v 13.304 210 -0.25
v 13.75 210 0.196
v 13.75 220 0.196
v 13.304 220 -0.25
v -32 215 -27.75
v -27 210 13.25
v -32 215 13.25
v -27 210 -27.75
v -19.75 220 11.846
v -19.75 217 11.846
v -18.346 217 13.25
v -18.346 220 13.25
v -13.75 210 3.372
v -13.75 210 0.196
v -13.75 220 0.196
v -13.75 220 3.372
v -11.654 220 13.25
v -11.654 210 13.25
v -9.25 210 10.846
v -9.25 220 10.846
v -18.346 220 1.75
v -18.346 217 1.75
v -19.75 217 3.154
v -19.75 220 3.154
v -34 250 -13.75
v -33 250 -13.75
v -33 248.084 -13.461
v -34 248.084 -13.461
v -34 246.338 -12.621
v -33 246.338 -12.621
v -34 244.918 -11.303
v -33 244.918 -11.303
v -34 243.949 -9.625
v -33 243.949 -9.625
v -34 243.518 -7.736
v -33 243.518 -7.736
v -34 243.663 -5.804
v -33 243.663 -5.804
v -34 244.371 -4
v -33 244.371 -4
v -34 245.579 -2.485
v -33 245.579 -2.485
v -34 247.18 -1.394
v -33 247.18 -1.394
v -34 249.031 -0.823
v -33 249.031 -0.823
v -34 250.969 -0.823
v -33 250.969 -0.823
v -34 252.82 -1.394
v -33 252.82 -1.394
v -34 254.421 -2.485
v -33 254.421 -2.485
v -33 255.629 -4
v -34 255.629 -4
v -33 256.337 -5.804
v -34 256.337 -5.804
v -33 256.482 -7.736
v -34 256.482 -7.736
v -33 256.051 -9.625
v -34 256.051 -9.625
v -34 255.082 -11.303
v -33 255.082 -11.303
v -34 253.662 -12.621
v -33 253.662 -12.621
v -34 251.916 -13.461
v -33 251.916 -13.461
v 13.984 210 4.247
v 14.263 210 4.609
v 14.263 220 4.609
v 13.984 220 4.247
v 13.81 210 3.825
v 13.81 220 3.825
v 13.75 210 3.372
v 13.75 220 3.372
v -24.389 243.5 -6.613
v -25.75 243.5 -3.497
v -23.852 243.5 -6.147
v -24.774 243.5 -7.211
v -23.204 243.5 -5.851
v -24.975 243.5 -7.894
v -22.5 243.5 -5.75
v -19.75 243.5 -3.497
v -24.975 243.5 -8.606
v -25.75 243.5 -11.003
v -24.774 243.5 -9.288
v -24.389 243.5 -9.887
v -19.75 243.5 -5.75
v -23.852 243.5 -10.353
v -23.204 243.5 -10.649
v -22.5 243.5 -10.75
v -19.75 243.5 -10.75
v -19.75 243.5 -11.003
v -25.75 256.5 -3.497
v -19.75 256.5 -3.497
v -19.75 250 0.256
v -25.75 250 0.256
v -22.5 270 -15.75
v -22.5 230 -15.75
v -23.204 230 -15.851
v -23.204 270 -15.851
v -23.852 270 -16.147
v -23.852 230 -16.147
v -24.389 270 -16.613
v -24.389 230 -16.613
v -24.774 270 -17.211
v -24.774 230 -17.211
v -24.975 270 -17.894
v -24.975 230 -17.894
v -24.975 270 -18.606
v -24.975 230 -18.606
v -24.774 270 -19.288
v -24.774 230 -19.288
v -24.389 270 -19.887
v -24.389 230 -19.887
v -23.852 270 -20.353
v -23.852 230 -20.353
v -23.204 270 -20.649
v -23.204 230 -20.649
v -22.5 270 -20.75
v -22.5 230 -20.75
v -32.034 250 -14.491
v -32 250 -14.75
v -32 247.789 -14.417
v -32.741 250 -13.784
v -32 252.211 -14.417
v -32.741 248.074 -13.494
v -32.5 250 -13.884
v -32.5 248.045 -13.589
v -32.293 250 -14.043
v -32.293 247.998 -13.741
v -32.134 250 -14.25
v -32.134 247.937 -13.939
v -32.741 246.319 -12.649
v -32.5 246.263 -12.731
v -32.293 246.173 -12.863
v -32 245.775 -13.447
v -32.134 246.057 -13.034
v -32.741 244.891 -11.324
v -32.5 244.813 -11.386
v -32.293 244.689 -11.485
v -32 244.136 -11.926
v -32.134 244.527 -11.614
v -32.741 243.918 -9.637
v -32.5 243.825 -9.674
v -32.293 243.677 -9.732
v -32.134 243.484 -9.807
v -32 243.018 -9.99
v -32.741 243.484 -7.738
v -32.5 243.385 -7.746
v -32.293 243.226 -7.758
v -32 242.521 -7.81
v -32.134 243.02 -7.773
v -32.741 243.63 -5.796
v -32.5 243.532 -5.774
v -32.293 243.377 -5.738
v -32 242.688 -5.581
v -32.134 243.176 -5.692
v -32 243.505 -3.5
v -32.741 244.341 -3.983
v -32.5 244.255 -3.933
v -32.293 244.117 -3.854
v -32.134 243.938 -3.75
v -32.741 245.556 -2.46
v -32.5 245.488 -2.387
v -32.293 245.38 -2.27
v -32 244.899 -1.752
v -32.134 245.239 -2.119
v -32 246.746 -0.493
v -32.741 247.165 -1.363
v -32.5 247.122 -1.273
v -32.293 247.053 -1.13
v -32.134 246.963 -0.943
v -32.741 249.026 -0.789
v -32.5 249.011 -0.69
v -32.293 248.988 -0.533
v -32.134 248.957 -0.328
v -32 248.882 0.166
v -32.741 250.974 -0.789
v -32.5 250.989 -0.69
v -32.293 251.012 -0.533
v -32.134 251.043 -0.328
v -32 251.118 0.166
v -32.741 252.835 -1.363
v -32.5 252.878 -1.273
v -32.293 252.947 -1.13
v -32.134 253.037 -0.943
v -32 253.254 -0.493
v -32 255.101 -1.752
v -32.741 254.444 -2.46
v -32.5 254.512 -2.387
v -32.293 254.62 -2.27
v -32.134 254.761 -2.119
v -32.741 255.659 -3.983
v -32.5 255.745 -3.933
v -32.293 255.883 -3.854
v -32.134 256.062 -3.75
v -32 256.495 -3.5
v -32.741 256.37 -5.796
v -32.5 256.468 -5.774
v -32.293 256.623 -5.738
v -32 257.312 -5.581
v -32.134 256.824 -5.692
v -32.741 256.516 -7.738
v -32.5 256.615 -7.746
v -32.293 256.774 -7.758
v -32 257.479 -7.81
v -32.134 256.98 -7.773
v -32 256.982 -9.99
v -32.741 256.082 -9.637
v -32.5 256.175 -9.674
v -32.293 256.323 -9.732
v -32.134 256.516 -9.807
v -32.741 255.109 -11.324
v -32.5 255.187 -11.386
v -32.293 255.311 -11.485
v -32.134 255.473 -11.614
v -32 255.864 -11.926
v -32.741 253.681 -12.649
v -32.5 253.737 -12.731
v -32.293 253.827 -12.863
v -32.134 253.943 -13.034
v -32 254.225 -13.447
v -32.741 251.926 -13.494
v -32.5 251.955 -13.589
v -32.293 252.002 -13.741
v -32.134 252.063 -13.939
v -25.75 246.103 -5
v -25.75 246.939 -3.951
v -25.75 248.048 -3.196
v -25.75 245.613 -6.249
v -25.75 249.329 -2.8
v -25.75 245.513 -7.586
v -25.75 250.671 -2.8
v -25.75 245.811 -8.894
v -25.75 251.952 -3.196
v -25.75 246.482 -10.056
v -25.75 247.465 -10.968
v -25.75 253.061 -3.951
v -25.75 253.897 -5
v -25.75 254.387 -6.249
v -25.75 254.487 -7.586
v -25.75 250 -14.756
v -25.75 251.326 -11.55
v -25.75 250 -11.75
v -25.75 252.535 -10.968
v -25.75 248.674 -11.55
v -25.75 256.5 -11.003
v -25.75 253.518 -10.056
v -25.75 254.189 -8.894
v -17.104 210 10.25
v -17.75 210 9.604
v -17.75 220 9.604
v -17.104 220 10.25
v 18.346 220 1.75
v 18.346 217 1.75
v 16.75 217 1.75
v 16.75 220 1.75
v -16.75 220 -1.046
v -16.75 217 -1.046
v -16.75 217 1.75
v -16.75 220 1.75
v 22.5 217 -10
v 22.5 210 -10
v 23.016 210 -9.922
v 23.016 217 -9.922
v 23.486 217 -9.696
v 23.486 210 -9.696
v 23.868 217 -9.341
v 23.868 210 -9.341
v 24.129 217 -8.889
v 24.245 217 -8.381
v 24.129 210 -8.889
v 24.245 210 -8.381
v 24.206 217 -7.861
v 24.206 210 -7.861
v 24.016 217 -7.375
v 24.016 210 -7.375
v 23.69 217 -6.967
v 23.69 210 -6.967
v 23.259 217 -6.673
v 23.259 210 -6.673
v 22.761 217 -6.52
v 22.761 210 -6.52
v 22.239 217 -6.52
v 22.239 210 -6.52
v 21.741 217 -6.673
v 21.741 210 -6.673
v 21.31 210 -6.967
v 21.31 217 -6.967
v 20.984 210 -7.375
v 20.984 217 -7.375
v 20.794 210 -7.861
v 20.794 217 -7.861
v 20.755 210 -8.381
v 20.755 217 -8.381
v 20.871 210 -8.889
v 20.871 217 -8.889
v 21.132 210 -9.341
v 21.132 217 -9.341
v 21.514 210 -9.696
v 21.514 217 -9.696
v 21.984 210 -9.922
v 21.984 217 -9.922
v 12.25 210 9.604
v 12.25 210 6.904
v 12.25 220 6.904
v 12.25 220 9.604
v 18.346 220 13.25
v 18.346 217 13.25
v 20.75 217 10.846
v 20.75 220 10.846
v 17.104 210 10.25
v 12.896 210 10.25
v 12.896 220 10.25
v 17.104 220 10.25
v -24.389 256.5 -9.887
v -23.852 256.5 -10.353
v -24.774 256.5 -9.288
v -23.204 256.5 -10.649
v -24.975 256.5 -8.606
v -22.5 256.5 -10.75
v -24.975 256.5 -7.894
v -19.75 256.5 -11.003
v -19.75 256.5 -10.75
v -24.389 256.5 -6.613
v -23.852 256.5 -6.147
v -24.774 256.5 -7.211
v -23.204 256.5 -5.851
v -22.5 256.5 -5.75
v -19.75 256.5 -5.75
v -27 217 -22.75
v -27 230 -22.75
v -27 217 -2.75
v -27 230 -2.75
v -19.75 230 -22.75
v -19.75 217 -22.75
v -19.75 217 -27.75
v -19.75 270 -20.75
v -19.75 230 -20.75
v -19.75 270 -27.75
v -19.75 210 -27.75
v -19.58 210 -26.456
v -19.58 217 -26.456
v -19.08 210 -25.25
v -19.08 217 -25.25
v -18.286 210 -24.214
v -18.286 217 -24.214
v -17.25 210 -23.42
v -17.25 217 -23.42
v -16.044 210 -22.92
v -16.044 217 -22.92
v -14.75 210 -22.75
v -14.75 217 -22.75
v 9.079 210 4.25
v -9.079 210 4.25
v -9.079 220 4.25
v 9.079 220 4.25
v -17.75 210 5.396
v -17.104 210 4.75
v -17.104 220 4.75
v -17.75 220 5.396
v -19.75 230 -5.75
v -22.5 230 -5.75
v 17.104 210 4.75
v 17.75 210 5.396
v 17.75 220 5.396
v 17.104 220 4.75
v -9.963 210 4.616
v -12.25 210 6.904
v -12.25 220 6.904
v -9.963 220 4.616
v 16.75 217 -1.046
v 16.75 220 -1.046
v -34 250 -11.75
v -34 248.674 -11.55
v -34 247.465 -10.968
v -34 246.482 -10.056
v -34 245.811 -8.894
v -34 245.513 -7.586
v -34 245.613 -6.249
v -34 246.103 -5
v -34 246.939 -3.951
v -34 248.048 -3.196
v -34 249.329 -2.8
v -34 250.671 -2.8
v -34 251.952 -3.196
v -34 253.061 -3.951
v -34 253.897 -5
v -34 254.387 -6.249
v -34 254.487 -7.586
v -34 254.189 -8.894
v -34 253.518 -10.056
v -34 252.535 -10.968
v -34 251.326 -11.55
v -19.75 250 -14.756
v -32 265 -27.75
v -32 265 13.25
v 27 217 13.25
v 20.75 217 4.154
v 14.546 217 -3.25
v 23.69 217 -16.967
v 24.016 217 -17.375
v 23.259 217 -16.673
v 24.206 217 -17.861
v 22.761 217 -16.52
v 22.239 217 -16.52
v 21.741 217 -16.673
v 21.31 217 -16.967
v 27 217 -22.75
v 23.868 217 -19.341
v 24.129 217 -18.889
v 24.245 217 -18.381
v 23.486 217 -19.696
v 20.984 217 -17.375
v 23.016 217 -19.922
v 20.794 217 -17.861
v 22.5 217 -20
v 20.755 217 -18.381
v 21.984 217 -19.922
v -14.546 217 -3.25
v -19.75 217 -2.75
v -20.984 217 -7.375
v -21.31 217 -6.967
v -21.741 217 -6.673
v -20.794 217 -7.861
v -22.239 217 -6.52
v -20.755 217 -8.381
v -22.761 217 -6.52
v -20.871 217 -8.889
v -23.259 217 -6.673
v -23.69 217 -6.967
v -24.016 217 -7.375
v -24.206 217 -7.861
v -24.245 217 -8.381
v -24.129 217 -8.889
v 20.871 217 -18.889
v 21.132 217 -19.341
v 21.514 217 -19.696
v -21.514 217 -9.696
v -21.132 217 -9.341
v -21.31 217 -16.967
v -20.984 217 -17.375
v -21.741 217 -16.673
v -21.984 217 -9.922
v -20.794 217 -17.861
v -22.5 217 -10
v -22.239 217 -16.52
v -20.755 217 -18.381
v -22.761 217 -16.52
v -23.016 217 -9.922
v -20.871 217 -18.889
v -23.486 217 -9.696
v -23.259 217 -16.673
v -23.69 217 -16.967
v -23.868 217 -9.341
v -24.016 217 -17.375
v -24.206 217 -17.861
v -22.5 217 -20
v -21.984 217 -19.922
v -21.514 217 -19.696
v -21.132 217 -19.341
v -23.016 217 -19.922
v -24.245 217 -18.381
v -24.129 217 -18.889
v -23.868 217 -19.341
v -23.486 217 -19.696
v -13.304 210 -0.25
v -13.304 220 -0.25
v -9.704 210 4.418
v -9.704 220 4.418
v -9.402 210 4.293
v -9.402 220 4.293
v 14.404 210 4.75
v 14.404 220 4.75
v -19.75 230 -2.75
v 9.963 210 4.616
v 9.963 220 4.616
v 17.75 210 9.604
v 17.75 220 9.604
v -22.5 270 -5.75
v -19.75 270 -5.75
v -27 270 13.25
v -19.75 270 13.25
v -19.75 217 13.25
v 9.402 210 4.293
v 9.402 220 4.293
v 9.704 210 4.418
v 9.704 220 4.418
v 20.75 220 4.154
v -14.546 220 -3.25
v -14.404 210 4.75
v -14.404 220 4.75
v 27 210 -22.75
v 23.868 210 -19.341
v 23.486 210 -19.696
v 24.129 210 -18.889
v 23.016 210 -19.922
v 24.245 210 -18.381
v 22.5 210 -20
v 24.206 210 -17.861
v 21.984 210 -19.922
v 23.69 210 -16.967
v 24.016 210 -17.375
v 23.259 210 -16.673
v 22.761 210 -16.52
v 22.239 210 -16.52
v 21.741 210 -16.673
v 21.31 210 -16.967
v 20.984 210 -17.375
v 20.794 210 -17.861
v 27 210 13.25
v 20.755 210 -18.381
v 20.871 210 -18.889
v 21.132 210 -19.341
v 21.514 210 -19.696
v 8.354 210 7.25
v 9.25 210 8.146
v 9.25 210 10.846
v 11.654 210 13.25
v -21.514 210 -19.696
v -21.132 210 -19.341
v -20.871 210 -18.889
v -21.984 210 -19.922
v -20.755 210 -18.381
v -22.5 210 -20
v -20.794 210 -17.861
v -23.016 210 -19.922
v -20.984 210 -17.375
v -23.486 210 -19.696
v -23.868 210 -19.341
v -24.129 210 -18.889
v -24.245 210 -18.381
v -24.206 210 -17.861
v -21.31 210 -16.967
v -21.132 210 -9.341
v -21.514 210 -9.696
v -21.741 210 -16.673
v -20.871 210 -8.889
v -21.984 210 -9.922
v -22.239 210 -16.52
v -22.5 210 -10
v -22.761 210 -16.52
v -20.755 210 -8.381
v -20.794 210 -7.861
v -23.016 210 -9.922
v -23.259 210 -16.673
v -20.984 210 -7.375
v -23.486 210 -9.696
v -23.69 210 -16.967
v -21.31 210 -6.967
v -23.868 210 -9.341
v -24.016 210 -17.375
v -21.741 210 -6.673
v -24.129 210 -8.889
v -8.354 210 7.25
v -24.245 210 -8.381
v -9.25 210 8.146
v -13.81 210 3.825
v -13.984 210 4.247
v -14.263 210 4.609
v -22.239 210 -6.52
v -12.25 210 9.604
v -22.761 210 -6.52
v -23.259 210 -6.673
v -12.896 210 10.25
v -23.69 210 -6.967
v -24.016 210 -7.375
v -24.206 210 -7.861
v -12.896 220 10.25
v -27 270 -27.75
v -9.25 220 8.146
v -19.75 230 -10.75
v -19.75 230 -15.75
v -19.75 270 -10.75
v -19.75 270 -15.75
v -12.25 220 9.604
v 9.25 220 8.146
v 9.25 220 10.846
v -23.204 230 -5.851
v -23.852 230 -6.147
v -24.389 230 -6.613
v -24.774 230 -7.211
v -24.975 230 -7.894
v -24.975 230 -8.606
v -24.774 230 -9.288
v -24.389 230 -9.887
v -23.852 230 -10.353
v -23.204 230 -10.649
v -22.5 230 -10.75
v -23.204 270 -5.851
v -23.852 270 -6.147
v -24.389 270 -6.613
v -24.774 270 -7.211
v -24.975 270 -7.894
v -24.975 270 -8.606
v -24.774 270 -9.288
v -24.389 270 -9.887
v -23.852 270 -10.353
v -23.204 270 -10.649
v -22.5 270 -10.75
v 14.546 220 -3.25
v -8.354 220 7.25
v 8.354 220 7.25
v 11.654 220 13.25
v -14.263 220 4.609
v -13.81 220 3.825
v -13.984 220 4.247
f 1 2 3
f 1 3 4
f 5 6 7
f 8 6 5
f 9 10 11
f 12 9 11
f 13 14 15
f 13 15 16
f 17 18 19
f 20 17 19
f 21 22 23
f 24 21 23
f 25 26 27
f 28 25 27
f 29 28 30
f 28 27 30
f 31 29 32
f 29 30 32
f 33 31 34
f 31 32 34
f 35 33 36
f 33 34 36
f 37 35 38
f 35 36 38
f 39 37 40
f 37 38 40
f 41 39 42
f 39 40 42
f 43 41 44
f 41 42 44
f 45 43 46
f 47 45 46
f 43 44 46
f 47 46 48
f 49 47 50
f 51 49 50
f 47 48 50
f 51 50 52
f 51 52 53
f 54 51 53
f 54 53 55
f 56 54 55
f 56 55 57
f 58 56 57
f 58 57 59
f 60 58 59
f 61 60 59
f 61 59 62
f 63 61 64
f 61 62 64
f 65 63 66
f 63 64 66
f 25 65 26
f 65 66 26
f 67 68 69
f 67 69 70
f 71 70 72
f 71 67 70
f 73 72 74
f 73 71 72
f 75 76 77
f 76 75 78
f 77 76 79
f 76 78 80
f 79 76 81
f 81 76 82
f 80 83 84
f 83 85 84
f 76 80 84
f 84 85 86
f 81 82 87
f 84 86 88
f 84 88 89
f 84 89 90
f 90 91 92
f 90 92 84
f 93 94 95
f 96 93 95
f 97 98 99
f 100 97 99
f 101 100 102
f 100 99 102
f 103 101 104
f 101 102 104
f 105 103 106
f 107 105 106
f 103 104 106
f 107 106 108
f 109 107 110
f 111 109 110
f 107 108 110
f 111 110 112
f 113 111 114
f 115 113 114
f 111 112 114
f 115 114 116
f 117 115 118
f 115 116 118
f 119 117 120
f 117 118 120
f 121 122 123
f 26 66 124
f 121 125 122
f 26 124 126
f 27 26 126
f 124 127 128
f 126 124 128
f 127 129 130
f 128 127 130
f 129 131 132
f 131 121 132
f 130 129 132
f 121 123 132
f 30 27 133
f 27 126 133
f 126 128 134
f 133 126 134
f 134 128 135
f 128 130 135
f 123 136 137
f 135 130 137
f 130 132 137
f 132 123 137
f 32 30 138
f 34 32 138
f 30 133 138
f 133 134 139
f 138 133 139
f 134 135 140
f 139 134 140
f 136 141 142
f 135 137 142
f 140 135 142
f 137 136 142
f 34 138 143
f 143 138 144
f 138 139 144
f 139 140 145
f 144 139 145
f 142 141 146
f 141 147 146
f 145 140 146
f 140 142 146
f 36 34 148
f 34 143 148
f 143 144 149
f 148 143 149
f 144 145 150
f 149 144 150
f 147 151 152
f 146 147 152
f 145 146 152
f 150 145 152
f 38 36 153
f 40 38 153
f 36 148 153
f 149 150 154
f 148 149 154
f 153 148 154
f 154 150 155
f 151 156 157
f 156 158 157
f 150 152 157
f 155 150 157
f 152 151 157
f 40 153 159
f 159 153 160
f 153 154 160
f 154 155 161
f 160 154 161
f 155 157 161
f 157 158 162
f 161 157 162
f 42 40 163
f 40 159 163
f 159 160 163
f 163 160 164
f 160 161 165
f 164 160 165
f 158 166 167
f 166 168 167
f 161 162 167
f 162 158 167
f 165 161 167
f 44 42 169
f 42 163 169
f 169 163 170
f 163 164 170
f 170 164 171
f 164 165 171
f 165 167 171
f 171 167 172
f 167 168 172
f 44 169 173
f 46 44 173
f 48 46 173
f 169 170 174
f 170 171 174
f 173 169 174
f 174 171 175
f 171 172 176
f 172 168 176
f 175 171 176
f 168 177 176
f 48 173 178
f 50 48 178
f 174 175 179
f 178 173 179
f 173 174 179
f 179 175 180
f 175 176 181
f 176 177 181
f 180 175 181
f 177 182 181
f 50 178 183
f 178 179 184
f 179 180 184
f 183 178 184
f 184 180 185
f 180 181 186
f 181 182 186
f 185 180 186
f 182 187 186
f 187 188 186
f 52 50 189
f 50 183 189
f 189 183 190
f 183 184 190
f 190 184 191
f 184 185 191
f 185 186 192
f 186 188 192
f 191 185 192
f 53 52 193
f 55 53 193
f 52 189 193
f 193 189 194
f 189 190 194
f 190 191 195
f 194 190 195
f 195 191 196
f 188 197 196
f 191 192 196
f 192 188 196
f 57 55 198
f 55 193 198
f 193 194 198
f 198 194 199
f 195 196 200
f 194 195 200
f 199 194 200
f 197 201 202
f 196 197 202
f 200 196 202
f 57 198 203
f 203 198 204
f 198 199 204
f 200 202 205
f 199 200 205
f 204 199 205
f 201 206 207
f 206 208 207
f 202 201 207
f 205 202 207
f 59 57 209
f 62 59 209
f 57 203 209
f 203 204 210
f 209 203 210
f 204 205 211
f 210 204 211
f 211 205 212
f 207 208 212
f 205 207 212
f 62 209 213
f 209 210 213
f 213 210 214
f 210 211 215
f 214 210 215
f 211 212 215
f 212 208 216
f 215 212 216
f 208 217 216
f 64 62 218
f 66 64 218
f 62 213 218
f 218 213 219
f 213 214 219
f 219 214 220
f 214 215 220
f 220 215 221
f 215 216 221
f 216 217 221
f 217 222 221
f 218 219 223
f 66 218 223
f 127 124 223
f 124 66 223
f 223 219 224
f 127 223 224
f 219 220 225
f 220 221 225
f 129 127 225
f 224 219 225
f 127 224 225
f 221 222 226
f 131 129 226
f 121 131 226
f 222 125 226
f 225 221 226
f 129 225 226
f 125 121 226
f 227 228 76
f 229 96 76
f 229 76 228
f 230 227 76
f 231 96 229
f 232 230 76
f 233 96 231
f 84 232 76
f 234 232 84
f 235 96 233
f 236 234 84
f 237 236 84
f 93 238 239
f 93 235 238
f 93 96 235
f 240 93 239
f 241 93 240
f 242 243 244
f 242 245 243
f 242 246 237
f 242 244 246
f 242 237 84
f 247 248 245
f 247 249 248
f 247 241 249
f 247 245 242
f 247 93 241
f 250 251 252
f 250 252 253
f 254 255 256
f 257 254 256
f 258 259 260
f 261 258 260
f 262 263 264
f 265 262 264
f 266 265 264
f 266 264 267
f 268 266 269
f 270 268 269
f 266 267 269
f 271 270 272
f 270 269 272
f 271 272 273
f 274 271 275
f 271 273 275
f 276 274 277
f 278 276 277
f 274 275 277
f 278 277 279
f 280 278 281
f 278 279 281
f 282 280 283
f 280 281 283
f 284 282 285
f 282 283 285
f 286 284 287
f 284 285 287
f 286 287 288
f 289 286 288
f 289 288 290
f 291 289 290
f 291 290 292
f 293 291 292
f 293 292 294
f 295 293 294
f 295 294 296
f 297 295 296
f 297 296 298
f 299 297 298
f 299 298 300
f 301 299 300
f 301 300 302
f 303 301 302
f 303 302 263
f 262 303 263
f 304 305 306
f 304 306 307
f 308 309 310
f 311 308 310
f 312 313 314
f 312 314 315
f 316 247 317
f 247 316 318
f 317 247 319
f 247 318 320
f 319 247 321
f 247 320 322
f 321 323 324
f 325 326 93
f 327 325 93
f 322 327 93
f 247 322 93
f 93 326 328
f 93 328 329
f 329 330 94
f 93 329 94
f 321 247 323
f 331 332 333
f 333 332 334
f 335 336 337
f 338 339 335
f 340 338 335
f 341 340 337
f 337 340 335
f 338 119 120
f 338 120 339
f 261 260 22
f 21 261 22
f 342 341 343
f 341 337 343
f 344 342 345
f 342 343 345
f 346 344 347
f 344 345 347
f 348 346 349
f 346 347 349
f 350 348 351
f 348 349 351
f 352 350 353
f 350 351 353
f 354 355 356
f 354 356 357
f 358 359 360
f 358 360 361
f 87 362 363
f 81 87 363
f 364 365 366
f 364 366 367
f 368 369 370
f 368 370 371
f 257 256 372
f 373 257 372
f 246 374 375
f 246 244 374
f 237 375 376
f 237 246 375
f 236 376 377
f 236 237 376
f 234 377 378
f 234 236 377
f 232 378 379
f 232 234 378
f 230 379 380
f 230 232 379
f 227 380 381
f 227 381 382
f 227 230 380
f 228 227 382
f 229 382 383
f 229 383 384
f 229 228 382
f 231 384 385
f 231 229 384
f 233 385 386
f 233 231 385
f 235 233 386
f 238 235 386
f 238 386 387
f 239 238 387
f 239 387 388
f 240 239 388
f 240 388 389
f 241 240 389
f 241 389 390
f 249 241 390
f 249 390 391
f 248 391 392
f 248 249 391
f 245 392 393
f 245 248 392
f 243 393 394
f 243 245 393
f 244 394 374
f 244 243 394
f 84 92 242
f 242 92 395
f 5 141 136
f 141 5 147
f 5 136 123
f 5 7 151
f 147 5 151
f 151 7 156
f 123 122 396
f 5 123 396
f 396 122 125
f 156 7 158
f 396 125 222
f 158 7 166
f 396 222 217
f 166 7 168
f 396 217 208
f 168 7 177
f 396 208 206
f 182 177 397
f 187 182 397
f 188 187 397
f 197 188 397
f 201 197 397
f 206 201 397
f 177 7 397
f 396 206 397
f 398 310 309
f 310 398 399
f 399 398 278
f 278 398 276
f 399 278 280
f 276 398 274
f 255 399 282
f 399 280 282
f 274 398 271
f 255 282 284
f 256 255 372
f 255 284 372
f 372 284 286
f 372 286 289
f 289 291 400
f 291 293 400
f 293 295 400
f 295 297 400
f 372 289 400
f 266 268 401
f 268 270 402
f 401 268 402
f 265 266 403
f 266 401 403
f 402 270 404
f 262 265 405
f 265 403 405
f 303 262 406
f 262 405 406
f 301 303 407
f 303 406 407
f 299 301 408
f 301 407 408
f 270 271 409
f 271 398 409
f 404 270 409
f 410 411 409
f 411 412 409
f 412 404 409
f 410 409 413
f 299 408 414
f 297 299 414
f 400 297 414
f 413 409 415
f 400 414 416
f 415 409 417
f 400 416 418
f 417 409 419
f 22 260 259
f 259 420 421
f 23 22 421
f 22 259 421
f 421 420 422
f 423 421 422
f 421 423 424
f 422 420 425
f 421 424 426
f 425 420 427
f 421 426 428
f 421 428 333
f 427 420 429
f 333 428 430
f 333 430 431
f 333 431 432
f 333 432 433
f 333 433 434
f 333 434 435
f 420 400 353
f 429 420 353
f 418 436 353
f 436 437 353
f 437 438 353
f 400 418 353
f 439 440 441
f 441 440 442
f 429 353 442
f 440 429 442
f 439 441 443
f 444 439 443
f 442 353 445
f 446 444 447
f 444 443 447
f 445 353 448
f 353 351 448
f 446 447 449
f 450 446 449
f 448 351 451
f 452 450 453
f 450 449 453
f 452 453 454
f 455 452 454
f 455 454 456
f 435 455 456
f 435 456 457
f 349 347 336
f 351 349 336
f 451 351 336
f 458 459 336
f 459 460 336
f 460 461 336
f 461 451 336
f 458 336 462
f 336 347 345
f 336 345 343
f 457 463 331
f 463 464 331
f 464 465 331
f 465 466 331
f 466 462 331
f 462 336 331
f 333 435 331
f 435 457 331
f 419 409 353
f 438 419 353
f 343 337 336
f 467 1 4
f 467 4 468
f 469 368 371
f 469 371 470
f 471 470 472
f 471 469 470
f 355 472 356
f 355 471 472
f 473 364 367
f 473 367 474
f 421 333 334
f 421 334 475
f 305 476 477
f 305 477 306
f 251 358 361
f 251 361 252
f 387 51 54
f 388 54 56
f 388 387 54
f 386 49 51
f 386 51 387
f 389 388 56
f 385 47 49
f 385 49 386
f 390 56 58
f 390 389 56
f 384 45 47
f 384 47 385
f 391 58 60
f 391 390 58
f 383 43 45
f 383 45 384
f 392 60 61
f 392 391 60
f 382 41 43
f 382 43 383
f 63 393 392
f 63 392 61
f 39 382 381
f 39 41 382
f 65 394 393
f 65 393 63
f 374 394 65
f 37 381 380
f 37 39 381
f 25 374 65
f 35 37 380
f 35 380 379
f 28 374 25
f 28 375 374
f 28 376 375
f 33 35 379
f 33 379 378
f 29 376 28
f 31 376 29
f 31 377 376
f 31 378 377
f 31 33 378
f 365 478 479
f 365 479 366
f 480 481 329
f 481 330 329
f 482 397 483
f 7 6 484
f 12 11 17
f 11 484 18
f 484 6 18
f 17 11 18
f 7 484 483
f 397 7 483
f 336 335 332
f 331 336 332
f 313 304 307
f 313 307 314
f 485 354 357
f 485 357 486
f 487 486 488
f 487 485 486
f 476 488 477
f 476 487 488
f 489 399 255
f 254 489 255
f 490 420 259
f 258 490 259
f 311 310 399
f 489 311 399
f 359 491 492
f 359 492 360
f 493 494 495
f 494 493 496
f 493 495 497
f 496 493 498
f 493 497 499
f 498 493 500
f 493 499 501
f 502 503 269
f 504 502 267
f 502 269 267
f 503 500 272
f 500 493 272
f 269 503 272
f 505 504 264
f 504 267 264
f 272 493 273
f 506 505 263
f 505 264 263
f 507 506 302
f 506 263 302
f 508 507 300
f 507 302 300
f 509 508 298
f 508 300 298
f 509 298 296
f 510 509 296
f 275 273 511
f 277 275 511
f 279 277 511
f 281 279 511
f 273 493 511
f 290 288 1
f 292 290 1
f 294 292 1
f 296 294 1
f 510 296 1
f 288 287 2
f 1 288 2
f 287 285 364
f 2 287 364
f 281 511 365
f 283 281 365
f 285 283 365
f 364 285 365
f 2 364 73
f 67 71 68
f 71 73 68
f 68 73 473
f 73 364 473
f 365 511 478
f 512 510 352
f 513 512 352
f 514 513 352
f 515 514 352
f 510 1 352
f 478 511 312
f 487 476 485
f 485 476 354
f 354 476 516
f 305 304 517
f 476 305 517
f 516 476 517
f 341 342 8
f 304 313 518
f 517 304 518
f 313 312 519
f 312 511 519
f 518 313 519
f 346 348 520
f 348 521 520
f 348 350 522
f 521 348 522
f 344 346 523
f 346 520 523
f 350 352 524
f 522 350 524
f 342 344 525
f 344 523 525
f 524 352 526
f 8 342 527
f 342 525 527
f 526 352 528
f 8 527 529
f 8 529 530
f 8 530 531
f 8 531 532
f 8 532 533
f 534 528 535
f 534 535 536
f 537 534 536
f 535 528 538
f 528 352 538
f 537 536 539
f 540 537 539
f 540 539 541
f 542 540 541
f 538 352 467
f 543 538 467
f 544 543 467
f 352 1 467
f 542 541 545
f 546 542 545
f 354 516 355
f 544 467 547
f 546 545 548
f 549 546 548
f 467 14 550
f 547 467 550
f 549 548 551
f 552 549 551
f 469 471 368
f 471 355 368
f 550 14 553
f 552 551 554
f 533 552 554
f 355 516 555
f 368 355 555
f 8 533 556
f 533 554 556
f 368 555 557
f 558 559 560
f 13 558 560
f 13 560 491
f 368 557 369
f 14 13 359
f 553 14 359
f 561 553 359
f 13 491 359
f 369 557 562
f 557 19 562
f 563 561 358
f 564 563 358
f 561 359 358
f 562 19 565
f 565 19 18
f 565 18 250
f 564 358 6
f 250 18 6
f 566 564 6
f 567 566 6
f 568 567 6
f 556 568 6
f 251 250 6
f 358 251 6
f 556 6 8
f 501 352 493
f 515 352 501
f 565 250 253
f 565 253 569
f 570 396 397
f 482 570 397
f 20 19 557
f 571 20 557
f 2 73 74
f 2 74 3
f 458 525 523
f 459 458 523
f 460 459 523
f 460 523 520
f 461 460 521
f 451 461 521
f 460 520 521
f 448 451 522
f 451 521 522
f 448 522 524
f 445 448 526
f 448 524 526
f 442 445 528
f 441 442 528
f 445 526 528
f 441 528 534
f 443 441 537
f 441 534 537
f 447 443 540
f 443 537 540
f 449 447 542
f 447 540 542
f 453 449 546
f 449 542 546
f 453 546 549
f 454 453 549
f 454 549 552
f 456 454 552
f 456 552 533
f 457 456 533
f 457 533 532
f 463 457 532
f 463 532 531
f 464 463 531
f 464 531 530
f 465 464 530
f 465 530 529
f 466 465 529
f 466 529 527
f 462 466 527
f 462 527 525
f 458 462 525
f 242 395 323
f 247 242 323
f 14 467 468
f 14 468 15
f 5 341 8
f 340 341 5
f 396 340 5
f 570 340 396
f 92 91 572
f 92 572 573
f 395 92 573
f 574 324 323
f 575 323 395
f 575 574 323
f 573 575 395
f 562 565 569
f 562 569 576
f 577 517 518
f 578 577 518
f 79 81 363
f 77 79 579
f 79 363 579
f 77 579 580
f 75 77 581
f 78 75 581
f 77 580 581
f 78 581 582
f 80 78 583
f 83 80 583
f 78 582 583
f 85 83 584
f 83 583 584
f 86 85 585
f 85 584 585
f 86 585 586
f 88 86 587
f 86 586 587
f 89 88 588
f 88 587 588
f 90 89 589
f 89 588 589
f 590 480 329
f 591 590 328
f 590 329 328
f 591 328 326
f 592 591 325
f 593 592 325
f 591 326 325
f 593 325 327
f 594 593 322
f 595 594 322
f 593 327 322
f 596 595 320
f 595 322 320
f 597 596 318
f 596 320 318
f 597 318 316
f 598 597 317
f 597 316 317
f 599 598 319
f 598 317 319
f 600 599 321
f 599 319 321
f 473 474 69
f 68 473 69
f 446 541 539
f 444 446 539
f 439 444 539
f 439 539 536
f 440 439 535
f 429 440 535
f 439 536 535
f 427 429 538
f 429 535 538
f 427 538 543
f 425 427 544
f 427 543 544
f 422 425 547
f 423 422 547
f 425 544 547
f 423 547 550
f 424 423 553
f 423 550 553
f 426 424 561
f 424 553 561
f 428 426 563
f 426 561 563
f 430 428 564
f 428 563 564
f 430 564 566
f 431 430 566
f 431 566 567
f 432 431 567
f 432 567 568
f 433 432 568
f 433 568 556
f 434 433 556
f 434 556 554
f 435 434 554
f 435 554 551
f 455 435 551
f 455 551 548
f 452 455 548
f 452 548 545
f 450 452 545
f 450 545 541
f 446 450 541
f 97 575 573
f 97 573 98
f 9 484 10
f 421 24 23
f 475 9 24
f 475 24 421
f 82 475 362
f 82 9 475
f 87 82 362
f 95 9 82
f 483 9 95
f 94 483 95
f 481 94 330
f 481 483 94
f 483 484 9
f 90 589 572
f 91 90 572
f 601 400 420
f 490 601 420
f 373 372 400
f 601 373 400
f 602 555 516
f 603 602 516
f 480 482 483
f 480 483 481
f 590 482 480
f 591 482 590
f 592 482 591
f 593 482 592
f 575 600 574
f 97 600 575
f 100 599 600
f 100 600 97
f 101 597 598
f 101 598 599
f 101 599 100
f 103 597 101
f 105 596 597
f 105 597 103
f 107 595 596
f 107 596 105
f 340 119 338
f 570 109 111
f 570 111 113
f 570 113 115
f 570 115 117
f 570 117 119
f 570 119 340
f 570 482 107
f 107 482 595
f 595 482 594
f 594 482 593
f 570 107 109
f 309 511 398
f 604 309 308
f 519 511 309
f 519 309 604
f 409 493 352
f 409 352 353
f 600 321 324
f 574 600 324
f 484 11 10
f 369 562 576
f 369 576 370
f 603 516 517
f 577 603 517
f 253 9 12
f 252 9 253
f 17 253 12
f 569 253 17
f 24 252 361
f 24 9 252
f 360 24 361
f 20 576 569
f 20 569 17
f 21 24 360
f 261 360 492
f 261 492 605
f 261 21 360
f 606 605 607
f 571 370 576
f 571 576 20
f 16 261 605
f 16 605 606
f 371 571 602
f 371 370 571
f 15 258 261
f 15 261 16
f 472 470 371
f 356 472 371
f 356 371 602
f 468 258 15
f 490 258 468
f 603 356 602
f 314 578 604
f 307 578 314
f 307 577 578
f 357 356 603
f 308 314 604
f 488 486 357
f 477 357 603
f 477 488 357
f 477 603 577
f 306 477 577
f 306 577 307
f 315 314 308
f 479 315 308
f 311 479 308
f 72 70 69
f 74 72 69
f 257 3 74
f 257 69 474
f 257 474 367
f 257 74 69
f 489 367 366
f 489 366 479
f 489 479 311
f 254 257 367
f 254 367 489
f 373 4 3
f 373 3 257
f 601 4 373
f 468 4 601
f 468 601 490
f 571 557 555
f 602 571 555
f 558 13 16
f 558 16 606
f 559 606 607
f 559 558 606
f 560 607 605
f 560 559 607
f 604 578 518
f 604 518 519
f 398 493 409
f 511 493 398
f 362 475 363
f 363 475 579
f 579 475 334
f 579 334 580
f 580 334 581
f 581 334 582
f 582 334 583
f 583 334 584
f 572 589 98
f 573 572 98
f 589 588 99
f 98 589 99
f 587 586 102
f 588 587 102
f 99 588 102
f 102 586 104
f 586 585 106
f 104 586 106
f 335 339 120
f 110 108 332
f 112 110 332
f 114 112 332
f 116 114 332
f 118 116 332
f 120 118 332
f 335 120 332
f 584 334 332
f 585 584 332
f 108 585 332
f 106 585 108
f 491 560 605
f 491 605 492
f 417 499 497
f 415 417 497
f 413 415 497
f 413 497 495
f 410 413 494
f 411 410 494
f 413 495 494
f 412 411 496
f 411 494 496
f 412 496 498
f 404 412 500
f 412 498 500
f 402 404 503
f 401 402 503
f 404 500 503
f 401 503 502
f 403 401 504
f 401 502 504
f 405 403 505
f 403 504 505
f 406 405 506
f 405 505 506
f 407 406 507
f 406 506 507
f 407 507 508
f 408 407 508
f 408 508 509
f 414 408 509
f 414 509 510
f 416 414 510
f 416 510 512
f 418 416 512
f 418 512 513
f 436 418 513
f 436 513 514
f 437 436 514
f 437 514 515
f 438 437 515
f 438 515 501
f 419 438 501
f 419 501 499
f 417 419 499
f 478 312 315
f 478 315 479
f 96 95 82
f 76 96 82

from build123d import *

# Parameters (mm, degrees)
BOSS_EXTRUDE1_DEPTH = 400
BOSS_EXTRUDE2_DEPTH = 10
SKETCH3_R           = 43.000999871
CUT_EXTRUDE1_DEPTH  = 447.360216168
BOSS_EXTRUDE3_DEPTH = 7
SKETCH5_R           = 1.75
CUT_EXTRUDE2_DEPTH  = 33
SKETCH6_W           = 36.000000185
SKETCH6_H           = 60
BOSS_EXTRUDE4_DEPTH = 5
SKETCH7_W           = 7.24997928
SKETCH7_H           = 16
BOSS_EXTRUDE5_DEPTH = 53
SKETCH8_W           = 12.24997928
SKETCH8_H           = 60
BOSS_EXTRUDE6_DEPTH = 5
FILLET1_R           = 5
SKETCH10_W          = 20.000000185
SKETCH10_H          = 40
BOSS_EXTRUDE7_DEPTH = 7.24997928
CUT_EXTRUDE3_DEPTH  = 6
CUT_EXTRUDE4_DEPTH  = 68.845857758
SKETCH12_R          = 4.5
CUT_EXTRUDE5_DEPTH  = 16
CHAMFER2_SIZE       = 5
CHAMFER3_SIZE       = 5
SKETCH13_R          = 6.5
SKETCH13_R_2        = 4.5
BOSS_EXTRUDE8_DEPTH = 2
FILLET2_R           = 1


with BuildPart() as part:
    # Sketch1 → Boss-Extrude1 (new body)
    with BuildSketch(Plane(origin=(0, 200, 0), x_dir=(1, 0, 0), z_dir=(0, 1, 0))):
        with BuildLine():
            Line((1e-09, -3.855700002), (0.25, -4.00003757))
            Line((0.25, -4.00003757), (9.078700232, -4.00003757))
            ThreePointArc((9.078700232, -4.00003757), (9.652725366, -4.114218268), (10.139360377, -4.439377387))
            Line((10.139360377, -4.439377387), (12.500020747, -6.800037757))
            Line((12.500020747, -6.800037757), (12.500020747, -9.500037757))
            Line((12.500020747, -9.500037757), (13.00002072, -10.000037755))
            Line((13.00002072, -10.000037755), (17.00002072, -10.000037755))
            Line((17.00002072, -10.000037755), (17.500020747, -9.500037752))
            Line((17.500020747, -9.500037752), (17.500020747, -5.500037752))
            Line((17.500020747, -5.500037752), (17.00002075, -5.0000377))
            Line((17.00002075, -5.0000377), (14.30002072, -5.0000377))
            Line((14.30002072, -5.0000377), (14.085807141, -4.785824121))
            ThreePointArc((14.085807141, -4.785824121), (13.652261651, -4.136977442), (13.50002072, -3.371610598))
            Line((13.50002072, -3.371610598), (13.50002072, -0.30003757))
            Line((13.50002072, -0.30003757), (13.20002072, -3.757e-05))
            Line((13.20002072, -3.757e-05), (7.50002072, -3.757e-05))
            Line((7.50002072, -3.757e-05), (7.40002072, -0.10003757))
            Line((7.40002072, -0.10003757), (-7.40002072, -0.10003757))
            Line((-7.40002072, -0.10003757), (-7.50002072, -3.757e-05))
            Line((-7.50002072, -3.757e-05), (-13.20002072, -3.757e-05))
            Line((-13.20002072, -3.757e-05), (-13.50002072, -0.30003757))
            Line((-13.50002072, -0.30003757), (-13.50002072, -3.371610628))
            ThreePointArc((-13.50002072, -3.371610628), (-13.652261651, -4.136977472), (-14.085807141, -4.785824151))
            Line((-14.085807141, -4.785824151), (-14.30002069, -5.0000377))
            Line((-14.30002069, -5.0000377), (-17.00002072, -5.0000377))
            Line((-17.00002072, -5.0000377), (-17.50002072, -5.50003767))
            Line((-17.50002072, -5.50003767), (-17.50002072, -9.50003767))
            Line((-17.50002072, -9.50003767), (-17.000020665, -10.000037755))
            Line((-17.000020665, -10.000037755), (-13.00002072, -10.000037755))
            Line((-13.00002072, -10.000037755), (-12.500020741, -9.500037764))
            Line((-12.500020741, -9.500037764), (-12.500020741, -6.800037764))
            Line((-12.500020741, -6.800037764), (-10.139360364, -4.439377387))
            ThreePointArc((-10.139360364, -4.439377387), (-9.652725352, -4.114218268), (-9.078700218, -4.00003757))
            Line((-9.078700218, -4.00003757), (-0.25, -4.00003757))
            Line((-0.25, -4.00003757), (1e-09, -3.855700002))
        make_face()
    extrude(amount=-BOSS_EXTRUDE1_DEPTH)

    # Sketch3 → Cut-Extrude1 (cut)
    with BuildSketch(Plane(origin=(0, 200, 0), x_dir=(1, 0, 0), z_dir=(0, 1, 0))):
        with Locations((0, -0.10003757)):
            Circle(SKETCH3_R)
    extrude(amount=-CUT_EXTRUDE1_DEPTH, mode=Mode.SUBTRACT)


with BuildPart() as body_2:
    # Sketch2 → Boss-Extrude2 (new body)
    with BuildSketch(Plane(origin=(0, 210, 0), x_dir=(1, 0, 0), z_dir=(0, 1, 0))):
        Polygon((-8.353826469, -7.25003757), (8.353826482, -7.25003757), (9.250020747, -8.146231835), (9.250020747, -10.846231788), (11.653826595, -13.250037755), (18.34621475, -13.250037755), (20.750020747, -10.846231878), (20.750020747, -4.153843779), (18.346214932, -1.7500377), (16.75002072, -1.7500377), (16.75002072, 1.046156508), (14.546214798, 3.24996243), (-14.546214798, 3.24996243), (-16.75002072, 1.046156508), (-16.75002072, -1.7500377), (-18.346214741, -1.7500377), (-20.75002072, -4.153843535), (-20.75002072, -10.846231691), (-18.3462148, -13.250037755), (-11.653826621, -13.250037755), (-9.250020741, -10.846231821), (-9.250020741, -8.146231842), align=None)
        with BuildLine():
            Line((13.303574111, 0.24996243), (-13.303574111, 0.24996243))
            Line((-13.303574111, 0.24996243), (-13.75002072, -0.196484179))
            Line((-13.75002072, -0.196484179), (-13.75002072, -3.371610628))
            ThreePointArc((-13.75002072, -3.371610628), (-13.883231534, -4.041306614), (-14.262583837, -4.609047456))
            Line((-14.262583837, -4.609047456), (-14.403574081, -4.7500377))
            Line((-14.403574081, -4.7500377), (-17.103574106, -4.7500377))
            Line((-17.103574106, -4.7500377), (-17.75002072, -5.396484275))
            Line((-17.75002072, -5.396484275), (-17.75002072, -9.603591056))
            Line((-17.75002072, -9.603591056), (-17.10357406, -10.250037755))
            Line((-17.10357406, -10.250037755), (-12.896467328, -10.250037755))
            Line((-12.896467328, -10.250037755), (-12.250020741, -9.603591153))
            Line((-12.250020741, -9.603591153), (-12.250020741, -6.903591155))
            Line((-12.250020741, -6.903591155), (-9.962583668, -4.616154083))
            ThreePointArc((-9.962583668, -4.616154083), (-9.557054494, -4.345188152), (-9.078700218, -4.25003757))
            Line((-9.078700218, -4.25003757), (9.078700232, -4.25003757))
            ThreePointArc((9.078700232, -4.25003757), (9.557054508, -4.345188152), (9.962583682, -4.616154083))
            Line((9.962583682, -4.616154083), (12.250020747, -6.903591148))
            Line((12.250020747, -6.903591148), (12.250020747, -9.603591144))
            Line((12.250020747, -9.603591144), (12.896467326, -10.250037755))
            Line((12.896467326, -10.250037755), (17.103574107, -10.250037755))
            Line((17.103574107, -10.250037755), (17.750020747, -9.603591147))
            Line((17.750020747, -9.603591147), (17.750020747, -5.39648437))
            Line((17.750020747, -5.39648437), (17.103574149, -4.7500377))
            Line((17.103574149, -4.7500377), (14.403574111, -4.7500377))
            Line((14.403574111, -4.7500377), (14.262583837, -4.609047426))
            ThreePointArc((14.262583837, -4.609047426), (13.883231534, -4.041306584), (13.75002072, -3.371610598))
            Line((13.75002072, -3.371610598), (13.75002072, -0.196484179))
            Line((13.75002072, -0.196484179), (13.303574111, 0.24996243))
        make_face(mode=Mode.SUBTRACT)
    extrude(amount=BOSS_EXTRUDE2_DEPTH)

    # Sketch4 → Boss-Extrude3 (add)
    with BuildSketch(Plane(origin=(0, 210, 0), x_dir=(-1, 0, 0), z_dir=(0, -1, 0))):
        Polygon((27, -13.250037755), (27, 22.74996243), (-27, 22.74996243), (-27, -13.250037755), (-18.34621475, -13.250037755), (-20.750020747, -10.846231878), (-20.750020747, -4.153843779), (-18.346214932, -1.7500377), (-16.75002072, -1.7500377), (-16.75002072, 1.046156508), (-14.546214798, 3.24996243), (14.546214798, 3.24996243), (16.75002072, 1.046156508), (16.75002072, -1.7500377), (18.346214741, -1.7500377), (20.75002072, -4.153843535), (20.75002072, -10.846231691), (18.3462148, -13.250037755), align=None)
    extrude(amount=-BOSS_EXTRUDE3_DEPTH)

    # Sketch5 → Cut-Extrude2 (cut)
    with BuildSketch(Plane(origin=(0, 210, 0), x_dir=(-1, 0, 0), z_dir=(0, -1, 0))):
        with Locations(Location((22.5, 18.24996243, 0), (0, 0, 90))):
            Circle(SKETCH5_R)
        with Locations(Location((22.5, 8.24996243, 0), (0, 0, 90))):
            Circle(SKETCH5_R)
        with Locations(Location((-22.5, 8.24996243, 0), (0, 0, 90))):
            Circle(SKETCH5_R)
        with Locations(Location((-22.5, 18.24996243, 0), (0, 0, 90))):
            Circle(SKETCH5_R)
    extrude(amount=-CUT_EXTRUDE2_DEPTH, mode=Mode.SUBTRACT)

    # Sketch6 → Boss-Extrude4 (add)
    with BuildSketch(Plane.ZY.offset(27)):
        with Locations((-4.749962337, 240)):
            Rectangle(SKETCH6_W, SKETCH6_H)
    extrude(amount=BOSS_EXTRUDE4_DEPTH)

    # Sketch7 → Boss-Extrude5 (add)
    with BuildSketch(Plane(origin=(0, 217, 0), x_dir=(1, 0, 0), z_dir=(0, 1, 0))):
        with Locations((-23.37501036, -5.250037755)):
            Rectangle(SKETCH7_W, SKETCH7_H)
    extrude(amount=BOSS_EXTRUDE5_DEPTH)

    # Sketch8 → Boss-Extrude6 (add)
    with BuildSketch(Plane(origin=(0, 0, -22.74996243), x_dir=(-1, 0, 0), z_dir=(0, 0, -1))):
        with Locations((25.87501036, 240)):
            Rectangle(SKETCH8_W, SKETCH8_H)
    extrude(amount=BOSS_EXTRUDE6_DEPTH)

    # Fillet1
    fillet1_edges = [body_2.edges().sort_by_distance(p)[0] for p in [
        (-19.75002072, 213.5, -22.74996243),
    ]]
    fillet(fillet1_edges, radius=FILLET1_R - 0.0001)  # a hair under: the kernel refuses the full size

    # Sketch10 → Boss-Extrude7 (add)
    with BuildSketch(Plane(origin=(-27, 0, 0), x_dir=(0, 0, -1), z_dir=(1, 0, 0))):
        with Locations((12.749962337, 250)):
            Rectangle(SKETCH10_W, SKETCH10_H)
    extrude(amount=BOSS_EXTRUDE7_DEPTH)

    # Sketch9 → Cut-Extrude3 (cut)
    with BuildSketch(Plane(origin=(-19.75002072, 0, 0), x_dir=(0, 0, -1), z_dir=(1, 0, 0))):
        Polygon((14.755515837, 250), (11.002739087, 256.5), (3.497185588, 256.5), (-0.255591162, 250), (3.497185588, 243.5), (11.002739087, 243.5), align=None)
    extrude(amount=-CUT_EXTRUDE3_DEPTH, mode=Mode.SUBTRACT)

    # Sketch11 → Cut-Extrude4 (cut, through all)
    with BuildSketch(Plane(origin=(0, 217, 0), x_dir=(1, 0, 0), z_dir=(0, 1, 0))):
        with BuildLine():
            Line((-22.5, 20.74996243), (-17.824832595, 20.74996243))
            Line((-17.824832595, 20.74996243), (-17.824832595, 15.74996243))
            Line((-17.824832595, 15.74996243), (-22.5, 15.74996243))
            ThreePointArc((-22.5, 15.74996243), (-25, 18.24996243), (-22.5, 20.74996243))
        make_face()
        with BuildLine():
            Line((-22.5, 10.74996243), (-17.824832595, 10.74996243))
            Line((-17.824832595, 10.74996243), (-17.824832595, 5.74996243))
            Line((-17.824832595, 5.74996243), (-22.5, 5.74996243))
            ThreePointArc((-22.5, 5.74996243), (-25, 8.24996243), (-22.5, 10.74996243))
        make_face()
    extrude(amount=CUT_EXTRUDE4_DEPTH, mode=Mode.SUBTRACT)

    # Sketch12 → Cut-Extrude5 (cut)
    with BuildSketch(Plane(origin=(-25.75002072, 0, 0), x_dir=(0, 0, -1), z_dir=(1, 0, 0))):
        with Locations((7.249962338, 250)):
            Circle(SKETCH12_R)
    extrude(amount=-CUT_EXTRUDE5_DEPTH, mode=Mode.SUBTRACT)

    # Chamfer2
    chamfer2_edges = [body_2.edges().sort_by_distance(p)[0] for p in [
        (-32, 270, -7.249962337),
    ]]
    chamfer(chamfer2_edges, length=CHAMFER2_SIZE)

    # Chamfer3
    chamfer3_edges = [body_2.edges().sort_by_distance(p)[0] for p in [
        (-32, 210, -7.249962338),
    ]]
    chamfer(chamfer3_edges, length=CHAMFER3_SIZE)

    # Sketch13 → Boss-Extrude8 (add)
    with BuildSketch(Plane.ZY.offset(32)):
        with Locations(Location((-7.249962338, 250, 0), (0, 0, 180))):
            Circle(SKETCH13_R)
        with Locations(Location((-7.249962338, 250, 0), (0, 0, 180))):
            Circle(SKETCH13_R_2, mode=Mode.SUBTRACT)
    extrude(amount=BOSS_EXTRUDE8_DEPTH)

    # Fillet2
    fillet2_edges = [body_2.edges().sort_by_distance(p)[0] for p in [
        (-32, 250, -0.749962338),
    ]]
    fillet(fillet2_edges, radius=FILLET2_R)


solid = body_2.part
